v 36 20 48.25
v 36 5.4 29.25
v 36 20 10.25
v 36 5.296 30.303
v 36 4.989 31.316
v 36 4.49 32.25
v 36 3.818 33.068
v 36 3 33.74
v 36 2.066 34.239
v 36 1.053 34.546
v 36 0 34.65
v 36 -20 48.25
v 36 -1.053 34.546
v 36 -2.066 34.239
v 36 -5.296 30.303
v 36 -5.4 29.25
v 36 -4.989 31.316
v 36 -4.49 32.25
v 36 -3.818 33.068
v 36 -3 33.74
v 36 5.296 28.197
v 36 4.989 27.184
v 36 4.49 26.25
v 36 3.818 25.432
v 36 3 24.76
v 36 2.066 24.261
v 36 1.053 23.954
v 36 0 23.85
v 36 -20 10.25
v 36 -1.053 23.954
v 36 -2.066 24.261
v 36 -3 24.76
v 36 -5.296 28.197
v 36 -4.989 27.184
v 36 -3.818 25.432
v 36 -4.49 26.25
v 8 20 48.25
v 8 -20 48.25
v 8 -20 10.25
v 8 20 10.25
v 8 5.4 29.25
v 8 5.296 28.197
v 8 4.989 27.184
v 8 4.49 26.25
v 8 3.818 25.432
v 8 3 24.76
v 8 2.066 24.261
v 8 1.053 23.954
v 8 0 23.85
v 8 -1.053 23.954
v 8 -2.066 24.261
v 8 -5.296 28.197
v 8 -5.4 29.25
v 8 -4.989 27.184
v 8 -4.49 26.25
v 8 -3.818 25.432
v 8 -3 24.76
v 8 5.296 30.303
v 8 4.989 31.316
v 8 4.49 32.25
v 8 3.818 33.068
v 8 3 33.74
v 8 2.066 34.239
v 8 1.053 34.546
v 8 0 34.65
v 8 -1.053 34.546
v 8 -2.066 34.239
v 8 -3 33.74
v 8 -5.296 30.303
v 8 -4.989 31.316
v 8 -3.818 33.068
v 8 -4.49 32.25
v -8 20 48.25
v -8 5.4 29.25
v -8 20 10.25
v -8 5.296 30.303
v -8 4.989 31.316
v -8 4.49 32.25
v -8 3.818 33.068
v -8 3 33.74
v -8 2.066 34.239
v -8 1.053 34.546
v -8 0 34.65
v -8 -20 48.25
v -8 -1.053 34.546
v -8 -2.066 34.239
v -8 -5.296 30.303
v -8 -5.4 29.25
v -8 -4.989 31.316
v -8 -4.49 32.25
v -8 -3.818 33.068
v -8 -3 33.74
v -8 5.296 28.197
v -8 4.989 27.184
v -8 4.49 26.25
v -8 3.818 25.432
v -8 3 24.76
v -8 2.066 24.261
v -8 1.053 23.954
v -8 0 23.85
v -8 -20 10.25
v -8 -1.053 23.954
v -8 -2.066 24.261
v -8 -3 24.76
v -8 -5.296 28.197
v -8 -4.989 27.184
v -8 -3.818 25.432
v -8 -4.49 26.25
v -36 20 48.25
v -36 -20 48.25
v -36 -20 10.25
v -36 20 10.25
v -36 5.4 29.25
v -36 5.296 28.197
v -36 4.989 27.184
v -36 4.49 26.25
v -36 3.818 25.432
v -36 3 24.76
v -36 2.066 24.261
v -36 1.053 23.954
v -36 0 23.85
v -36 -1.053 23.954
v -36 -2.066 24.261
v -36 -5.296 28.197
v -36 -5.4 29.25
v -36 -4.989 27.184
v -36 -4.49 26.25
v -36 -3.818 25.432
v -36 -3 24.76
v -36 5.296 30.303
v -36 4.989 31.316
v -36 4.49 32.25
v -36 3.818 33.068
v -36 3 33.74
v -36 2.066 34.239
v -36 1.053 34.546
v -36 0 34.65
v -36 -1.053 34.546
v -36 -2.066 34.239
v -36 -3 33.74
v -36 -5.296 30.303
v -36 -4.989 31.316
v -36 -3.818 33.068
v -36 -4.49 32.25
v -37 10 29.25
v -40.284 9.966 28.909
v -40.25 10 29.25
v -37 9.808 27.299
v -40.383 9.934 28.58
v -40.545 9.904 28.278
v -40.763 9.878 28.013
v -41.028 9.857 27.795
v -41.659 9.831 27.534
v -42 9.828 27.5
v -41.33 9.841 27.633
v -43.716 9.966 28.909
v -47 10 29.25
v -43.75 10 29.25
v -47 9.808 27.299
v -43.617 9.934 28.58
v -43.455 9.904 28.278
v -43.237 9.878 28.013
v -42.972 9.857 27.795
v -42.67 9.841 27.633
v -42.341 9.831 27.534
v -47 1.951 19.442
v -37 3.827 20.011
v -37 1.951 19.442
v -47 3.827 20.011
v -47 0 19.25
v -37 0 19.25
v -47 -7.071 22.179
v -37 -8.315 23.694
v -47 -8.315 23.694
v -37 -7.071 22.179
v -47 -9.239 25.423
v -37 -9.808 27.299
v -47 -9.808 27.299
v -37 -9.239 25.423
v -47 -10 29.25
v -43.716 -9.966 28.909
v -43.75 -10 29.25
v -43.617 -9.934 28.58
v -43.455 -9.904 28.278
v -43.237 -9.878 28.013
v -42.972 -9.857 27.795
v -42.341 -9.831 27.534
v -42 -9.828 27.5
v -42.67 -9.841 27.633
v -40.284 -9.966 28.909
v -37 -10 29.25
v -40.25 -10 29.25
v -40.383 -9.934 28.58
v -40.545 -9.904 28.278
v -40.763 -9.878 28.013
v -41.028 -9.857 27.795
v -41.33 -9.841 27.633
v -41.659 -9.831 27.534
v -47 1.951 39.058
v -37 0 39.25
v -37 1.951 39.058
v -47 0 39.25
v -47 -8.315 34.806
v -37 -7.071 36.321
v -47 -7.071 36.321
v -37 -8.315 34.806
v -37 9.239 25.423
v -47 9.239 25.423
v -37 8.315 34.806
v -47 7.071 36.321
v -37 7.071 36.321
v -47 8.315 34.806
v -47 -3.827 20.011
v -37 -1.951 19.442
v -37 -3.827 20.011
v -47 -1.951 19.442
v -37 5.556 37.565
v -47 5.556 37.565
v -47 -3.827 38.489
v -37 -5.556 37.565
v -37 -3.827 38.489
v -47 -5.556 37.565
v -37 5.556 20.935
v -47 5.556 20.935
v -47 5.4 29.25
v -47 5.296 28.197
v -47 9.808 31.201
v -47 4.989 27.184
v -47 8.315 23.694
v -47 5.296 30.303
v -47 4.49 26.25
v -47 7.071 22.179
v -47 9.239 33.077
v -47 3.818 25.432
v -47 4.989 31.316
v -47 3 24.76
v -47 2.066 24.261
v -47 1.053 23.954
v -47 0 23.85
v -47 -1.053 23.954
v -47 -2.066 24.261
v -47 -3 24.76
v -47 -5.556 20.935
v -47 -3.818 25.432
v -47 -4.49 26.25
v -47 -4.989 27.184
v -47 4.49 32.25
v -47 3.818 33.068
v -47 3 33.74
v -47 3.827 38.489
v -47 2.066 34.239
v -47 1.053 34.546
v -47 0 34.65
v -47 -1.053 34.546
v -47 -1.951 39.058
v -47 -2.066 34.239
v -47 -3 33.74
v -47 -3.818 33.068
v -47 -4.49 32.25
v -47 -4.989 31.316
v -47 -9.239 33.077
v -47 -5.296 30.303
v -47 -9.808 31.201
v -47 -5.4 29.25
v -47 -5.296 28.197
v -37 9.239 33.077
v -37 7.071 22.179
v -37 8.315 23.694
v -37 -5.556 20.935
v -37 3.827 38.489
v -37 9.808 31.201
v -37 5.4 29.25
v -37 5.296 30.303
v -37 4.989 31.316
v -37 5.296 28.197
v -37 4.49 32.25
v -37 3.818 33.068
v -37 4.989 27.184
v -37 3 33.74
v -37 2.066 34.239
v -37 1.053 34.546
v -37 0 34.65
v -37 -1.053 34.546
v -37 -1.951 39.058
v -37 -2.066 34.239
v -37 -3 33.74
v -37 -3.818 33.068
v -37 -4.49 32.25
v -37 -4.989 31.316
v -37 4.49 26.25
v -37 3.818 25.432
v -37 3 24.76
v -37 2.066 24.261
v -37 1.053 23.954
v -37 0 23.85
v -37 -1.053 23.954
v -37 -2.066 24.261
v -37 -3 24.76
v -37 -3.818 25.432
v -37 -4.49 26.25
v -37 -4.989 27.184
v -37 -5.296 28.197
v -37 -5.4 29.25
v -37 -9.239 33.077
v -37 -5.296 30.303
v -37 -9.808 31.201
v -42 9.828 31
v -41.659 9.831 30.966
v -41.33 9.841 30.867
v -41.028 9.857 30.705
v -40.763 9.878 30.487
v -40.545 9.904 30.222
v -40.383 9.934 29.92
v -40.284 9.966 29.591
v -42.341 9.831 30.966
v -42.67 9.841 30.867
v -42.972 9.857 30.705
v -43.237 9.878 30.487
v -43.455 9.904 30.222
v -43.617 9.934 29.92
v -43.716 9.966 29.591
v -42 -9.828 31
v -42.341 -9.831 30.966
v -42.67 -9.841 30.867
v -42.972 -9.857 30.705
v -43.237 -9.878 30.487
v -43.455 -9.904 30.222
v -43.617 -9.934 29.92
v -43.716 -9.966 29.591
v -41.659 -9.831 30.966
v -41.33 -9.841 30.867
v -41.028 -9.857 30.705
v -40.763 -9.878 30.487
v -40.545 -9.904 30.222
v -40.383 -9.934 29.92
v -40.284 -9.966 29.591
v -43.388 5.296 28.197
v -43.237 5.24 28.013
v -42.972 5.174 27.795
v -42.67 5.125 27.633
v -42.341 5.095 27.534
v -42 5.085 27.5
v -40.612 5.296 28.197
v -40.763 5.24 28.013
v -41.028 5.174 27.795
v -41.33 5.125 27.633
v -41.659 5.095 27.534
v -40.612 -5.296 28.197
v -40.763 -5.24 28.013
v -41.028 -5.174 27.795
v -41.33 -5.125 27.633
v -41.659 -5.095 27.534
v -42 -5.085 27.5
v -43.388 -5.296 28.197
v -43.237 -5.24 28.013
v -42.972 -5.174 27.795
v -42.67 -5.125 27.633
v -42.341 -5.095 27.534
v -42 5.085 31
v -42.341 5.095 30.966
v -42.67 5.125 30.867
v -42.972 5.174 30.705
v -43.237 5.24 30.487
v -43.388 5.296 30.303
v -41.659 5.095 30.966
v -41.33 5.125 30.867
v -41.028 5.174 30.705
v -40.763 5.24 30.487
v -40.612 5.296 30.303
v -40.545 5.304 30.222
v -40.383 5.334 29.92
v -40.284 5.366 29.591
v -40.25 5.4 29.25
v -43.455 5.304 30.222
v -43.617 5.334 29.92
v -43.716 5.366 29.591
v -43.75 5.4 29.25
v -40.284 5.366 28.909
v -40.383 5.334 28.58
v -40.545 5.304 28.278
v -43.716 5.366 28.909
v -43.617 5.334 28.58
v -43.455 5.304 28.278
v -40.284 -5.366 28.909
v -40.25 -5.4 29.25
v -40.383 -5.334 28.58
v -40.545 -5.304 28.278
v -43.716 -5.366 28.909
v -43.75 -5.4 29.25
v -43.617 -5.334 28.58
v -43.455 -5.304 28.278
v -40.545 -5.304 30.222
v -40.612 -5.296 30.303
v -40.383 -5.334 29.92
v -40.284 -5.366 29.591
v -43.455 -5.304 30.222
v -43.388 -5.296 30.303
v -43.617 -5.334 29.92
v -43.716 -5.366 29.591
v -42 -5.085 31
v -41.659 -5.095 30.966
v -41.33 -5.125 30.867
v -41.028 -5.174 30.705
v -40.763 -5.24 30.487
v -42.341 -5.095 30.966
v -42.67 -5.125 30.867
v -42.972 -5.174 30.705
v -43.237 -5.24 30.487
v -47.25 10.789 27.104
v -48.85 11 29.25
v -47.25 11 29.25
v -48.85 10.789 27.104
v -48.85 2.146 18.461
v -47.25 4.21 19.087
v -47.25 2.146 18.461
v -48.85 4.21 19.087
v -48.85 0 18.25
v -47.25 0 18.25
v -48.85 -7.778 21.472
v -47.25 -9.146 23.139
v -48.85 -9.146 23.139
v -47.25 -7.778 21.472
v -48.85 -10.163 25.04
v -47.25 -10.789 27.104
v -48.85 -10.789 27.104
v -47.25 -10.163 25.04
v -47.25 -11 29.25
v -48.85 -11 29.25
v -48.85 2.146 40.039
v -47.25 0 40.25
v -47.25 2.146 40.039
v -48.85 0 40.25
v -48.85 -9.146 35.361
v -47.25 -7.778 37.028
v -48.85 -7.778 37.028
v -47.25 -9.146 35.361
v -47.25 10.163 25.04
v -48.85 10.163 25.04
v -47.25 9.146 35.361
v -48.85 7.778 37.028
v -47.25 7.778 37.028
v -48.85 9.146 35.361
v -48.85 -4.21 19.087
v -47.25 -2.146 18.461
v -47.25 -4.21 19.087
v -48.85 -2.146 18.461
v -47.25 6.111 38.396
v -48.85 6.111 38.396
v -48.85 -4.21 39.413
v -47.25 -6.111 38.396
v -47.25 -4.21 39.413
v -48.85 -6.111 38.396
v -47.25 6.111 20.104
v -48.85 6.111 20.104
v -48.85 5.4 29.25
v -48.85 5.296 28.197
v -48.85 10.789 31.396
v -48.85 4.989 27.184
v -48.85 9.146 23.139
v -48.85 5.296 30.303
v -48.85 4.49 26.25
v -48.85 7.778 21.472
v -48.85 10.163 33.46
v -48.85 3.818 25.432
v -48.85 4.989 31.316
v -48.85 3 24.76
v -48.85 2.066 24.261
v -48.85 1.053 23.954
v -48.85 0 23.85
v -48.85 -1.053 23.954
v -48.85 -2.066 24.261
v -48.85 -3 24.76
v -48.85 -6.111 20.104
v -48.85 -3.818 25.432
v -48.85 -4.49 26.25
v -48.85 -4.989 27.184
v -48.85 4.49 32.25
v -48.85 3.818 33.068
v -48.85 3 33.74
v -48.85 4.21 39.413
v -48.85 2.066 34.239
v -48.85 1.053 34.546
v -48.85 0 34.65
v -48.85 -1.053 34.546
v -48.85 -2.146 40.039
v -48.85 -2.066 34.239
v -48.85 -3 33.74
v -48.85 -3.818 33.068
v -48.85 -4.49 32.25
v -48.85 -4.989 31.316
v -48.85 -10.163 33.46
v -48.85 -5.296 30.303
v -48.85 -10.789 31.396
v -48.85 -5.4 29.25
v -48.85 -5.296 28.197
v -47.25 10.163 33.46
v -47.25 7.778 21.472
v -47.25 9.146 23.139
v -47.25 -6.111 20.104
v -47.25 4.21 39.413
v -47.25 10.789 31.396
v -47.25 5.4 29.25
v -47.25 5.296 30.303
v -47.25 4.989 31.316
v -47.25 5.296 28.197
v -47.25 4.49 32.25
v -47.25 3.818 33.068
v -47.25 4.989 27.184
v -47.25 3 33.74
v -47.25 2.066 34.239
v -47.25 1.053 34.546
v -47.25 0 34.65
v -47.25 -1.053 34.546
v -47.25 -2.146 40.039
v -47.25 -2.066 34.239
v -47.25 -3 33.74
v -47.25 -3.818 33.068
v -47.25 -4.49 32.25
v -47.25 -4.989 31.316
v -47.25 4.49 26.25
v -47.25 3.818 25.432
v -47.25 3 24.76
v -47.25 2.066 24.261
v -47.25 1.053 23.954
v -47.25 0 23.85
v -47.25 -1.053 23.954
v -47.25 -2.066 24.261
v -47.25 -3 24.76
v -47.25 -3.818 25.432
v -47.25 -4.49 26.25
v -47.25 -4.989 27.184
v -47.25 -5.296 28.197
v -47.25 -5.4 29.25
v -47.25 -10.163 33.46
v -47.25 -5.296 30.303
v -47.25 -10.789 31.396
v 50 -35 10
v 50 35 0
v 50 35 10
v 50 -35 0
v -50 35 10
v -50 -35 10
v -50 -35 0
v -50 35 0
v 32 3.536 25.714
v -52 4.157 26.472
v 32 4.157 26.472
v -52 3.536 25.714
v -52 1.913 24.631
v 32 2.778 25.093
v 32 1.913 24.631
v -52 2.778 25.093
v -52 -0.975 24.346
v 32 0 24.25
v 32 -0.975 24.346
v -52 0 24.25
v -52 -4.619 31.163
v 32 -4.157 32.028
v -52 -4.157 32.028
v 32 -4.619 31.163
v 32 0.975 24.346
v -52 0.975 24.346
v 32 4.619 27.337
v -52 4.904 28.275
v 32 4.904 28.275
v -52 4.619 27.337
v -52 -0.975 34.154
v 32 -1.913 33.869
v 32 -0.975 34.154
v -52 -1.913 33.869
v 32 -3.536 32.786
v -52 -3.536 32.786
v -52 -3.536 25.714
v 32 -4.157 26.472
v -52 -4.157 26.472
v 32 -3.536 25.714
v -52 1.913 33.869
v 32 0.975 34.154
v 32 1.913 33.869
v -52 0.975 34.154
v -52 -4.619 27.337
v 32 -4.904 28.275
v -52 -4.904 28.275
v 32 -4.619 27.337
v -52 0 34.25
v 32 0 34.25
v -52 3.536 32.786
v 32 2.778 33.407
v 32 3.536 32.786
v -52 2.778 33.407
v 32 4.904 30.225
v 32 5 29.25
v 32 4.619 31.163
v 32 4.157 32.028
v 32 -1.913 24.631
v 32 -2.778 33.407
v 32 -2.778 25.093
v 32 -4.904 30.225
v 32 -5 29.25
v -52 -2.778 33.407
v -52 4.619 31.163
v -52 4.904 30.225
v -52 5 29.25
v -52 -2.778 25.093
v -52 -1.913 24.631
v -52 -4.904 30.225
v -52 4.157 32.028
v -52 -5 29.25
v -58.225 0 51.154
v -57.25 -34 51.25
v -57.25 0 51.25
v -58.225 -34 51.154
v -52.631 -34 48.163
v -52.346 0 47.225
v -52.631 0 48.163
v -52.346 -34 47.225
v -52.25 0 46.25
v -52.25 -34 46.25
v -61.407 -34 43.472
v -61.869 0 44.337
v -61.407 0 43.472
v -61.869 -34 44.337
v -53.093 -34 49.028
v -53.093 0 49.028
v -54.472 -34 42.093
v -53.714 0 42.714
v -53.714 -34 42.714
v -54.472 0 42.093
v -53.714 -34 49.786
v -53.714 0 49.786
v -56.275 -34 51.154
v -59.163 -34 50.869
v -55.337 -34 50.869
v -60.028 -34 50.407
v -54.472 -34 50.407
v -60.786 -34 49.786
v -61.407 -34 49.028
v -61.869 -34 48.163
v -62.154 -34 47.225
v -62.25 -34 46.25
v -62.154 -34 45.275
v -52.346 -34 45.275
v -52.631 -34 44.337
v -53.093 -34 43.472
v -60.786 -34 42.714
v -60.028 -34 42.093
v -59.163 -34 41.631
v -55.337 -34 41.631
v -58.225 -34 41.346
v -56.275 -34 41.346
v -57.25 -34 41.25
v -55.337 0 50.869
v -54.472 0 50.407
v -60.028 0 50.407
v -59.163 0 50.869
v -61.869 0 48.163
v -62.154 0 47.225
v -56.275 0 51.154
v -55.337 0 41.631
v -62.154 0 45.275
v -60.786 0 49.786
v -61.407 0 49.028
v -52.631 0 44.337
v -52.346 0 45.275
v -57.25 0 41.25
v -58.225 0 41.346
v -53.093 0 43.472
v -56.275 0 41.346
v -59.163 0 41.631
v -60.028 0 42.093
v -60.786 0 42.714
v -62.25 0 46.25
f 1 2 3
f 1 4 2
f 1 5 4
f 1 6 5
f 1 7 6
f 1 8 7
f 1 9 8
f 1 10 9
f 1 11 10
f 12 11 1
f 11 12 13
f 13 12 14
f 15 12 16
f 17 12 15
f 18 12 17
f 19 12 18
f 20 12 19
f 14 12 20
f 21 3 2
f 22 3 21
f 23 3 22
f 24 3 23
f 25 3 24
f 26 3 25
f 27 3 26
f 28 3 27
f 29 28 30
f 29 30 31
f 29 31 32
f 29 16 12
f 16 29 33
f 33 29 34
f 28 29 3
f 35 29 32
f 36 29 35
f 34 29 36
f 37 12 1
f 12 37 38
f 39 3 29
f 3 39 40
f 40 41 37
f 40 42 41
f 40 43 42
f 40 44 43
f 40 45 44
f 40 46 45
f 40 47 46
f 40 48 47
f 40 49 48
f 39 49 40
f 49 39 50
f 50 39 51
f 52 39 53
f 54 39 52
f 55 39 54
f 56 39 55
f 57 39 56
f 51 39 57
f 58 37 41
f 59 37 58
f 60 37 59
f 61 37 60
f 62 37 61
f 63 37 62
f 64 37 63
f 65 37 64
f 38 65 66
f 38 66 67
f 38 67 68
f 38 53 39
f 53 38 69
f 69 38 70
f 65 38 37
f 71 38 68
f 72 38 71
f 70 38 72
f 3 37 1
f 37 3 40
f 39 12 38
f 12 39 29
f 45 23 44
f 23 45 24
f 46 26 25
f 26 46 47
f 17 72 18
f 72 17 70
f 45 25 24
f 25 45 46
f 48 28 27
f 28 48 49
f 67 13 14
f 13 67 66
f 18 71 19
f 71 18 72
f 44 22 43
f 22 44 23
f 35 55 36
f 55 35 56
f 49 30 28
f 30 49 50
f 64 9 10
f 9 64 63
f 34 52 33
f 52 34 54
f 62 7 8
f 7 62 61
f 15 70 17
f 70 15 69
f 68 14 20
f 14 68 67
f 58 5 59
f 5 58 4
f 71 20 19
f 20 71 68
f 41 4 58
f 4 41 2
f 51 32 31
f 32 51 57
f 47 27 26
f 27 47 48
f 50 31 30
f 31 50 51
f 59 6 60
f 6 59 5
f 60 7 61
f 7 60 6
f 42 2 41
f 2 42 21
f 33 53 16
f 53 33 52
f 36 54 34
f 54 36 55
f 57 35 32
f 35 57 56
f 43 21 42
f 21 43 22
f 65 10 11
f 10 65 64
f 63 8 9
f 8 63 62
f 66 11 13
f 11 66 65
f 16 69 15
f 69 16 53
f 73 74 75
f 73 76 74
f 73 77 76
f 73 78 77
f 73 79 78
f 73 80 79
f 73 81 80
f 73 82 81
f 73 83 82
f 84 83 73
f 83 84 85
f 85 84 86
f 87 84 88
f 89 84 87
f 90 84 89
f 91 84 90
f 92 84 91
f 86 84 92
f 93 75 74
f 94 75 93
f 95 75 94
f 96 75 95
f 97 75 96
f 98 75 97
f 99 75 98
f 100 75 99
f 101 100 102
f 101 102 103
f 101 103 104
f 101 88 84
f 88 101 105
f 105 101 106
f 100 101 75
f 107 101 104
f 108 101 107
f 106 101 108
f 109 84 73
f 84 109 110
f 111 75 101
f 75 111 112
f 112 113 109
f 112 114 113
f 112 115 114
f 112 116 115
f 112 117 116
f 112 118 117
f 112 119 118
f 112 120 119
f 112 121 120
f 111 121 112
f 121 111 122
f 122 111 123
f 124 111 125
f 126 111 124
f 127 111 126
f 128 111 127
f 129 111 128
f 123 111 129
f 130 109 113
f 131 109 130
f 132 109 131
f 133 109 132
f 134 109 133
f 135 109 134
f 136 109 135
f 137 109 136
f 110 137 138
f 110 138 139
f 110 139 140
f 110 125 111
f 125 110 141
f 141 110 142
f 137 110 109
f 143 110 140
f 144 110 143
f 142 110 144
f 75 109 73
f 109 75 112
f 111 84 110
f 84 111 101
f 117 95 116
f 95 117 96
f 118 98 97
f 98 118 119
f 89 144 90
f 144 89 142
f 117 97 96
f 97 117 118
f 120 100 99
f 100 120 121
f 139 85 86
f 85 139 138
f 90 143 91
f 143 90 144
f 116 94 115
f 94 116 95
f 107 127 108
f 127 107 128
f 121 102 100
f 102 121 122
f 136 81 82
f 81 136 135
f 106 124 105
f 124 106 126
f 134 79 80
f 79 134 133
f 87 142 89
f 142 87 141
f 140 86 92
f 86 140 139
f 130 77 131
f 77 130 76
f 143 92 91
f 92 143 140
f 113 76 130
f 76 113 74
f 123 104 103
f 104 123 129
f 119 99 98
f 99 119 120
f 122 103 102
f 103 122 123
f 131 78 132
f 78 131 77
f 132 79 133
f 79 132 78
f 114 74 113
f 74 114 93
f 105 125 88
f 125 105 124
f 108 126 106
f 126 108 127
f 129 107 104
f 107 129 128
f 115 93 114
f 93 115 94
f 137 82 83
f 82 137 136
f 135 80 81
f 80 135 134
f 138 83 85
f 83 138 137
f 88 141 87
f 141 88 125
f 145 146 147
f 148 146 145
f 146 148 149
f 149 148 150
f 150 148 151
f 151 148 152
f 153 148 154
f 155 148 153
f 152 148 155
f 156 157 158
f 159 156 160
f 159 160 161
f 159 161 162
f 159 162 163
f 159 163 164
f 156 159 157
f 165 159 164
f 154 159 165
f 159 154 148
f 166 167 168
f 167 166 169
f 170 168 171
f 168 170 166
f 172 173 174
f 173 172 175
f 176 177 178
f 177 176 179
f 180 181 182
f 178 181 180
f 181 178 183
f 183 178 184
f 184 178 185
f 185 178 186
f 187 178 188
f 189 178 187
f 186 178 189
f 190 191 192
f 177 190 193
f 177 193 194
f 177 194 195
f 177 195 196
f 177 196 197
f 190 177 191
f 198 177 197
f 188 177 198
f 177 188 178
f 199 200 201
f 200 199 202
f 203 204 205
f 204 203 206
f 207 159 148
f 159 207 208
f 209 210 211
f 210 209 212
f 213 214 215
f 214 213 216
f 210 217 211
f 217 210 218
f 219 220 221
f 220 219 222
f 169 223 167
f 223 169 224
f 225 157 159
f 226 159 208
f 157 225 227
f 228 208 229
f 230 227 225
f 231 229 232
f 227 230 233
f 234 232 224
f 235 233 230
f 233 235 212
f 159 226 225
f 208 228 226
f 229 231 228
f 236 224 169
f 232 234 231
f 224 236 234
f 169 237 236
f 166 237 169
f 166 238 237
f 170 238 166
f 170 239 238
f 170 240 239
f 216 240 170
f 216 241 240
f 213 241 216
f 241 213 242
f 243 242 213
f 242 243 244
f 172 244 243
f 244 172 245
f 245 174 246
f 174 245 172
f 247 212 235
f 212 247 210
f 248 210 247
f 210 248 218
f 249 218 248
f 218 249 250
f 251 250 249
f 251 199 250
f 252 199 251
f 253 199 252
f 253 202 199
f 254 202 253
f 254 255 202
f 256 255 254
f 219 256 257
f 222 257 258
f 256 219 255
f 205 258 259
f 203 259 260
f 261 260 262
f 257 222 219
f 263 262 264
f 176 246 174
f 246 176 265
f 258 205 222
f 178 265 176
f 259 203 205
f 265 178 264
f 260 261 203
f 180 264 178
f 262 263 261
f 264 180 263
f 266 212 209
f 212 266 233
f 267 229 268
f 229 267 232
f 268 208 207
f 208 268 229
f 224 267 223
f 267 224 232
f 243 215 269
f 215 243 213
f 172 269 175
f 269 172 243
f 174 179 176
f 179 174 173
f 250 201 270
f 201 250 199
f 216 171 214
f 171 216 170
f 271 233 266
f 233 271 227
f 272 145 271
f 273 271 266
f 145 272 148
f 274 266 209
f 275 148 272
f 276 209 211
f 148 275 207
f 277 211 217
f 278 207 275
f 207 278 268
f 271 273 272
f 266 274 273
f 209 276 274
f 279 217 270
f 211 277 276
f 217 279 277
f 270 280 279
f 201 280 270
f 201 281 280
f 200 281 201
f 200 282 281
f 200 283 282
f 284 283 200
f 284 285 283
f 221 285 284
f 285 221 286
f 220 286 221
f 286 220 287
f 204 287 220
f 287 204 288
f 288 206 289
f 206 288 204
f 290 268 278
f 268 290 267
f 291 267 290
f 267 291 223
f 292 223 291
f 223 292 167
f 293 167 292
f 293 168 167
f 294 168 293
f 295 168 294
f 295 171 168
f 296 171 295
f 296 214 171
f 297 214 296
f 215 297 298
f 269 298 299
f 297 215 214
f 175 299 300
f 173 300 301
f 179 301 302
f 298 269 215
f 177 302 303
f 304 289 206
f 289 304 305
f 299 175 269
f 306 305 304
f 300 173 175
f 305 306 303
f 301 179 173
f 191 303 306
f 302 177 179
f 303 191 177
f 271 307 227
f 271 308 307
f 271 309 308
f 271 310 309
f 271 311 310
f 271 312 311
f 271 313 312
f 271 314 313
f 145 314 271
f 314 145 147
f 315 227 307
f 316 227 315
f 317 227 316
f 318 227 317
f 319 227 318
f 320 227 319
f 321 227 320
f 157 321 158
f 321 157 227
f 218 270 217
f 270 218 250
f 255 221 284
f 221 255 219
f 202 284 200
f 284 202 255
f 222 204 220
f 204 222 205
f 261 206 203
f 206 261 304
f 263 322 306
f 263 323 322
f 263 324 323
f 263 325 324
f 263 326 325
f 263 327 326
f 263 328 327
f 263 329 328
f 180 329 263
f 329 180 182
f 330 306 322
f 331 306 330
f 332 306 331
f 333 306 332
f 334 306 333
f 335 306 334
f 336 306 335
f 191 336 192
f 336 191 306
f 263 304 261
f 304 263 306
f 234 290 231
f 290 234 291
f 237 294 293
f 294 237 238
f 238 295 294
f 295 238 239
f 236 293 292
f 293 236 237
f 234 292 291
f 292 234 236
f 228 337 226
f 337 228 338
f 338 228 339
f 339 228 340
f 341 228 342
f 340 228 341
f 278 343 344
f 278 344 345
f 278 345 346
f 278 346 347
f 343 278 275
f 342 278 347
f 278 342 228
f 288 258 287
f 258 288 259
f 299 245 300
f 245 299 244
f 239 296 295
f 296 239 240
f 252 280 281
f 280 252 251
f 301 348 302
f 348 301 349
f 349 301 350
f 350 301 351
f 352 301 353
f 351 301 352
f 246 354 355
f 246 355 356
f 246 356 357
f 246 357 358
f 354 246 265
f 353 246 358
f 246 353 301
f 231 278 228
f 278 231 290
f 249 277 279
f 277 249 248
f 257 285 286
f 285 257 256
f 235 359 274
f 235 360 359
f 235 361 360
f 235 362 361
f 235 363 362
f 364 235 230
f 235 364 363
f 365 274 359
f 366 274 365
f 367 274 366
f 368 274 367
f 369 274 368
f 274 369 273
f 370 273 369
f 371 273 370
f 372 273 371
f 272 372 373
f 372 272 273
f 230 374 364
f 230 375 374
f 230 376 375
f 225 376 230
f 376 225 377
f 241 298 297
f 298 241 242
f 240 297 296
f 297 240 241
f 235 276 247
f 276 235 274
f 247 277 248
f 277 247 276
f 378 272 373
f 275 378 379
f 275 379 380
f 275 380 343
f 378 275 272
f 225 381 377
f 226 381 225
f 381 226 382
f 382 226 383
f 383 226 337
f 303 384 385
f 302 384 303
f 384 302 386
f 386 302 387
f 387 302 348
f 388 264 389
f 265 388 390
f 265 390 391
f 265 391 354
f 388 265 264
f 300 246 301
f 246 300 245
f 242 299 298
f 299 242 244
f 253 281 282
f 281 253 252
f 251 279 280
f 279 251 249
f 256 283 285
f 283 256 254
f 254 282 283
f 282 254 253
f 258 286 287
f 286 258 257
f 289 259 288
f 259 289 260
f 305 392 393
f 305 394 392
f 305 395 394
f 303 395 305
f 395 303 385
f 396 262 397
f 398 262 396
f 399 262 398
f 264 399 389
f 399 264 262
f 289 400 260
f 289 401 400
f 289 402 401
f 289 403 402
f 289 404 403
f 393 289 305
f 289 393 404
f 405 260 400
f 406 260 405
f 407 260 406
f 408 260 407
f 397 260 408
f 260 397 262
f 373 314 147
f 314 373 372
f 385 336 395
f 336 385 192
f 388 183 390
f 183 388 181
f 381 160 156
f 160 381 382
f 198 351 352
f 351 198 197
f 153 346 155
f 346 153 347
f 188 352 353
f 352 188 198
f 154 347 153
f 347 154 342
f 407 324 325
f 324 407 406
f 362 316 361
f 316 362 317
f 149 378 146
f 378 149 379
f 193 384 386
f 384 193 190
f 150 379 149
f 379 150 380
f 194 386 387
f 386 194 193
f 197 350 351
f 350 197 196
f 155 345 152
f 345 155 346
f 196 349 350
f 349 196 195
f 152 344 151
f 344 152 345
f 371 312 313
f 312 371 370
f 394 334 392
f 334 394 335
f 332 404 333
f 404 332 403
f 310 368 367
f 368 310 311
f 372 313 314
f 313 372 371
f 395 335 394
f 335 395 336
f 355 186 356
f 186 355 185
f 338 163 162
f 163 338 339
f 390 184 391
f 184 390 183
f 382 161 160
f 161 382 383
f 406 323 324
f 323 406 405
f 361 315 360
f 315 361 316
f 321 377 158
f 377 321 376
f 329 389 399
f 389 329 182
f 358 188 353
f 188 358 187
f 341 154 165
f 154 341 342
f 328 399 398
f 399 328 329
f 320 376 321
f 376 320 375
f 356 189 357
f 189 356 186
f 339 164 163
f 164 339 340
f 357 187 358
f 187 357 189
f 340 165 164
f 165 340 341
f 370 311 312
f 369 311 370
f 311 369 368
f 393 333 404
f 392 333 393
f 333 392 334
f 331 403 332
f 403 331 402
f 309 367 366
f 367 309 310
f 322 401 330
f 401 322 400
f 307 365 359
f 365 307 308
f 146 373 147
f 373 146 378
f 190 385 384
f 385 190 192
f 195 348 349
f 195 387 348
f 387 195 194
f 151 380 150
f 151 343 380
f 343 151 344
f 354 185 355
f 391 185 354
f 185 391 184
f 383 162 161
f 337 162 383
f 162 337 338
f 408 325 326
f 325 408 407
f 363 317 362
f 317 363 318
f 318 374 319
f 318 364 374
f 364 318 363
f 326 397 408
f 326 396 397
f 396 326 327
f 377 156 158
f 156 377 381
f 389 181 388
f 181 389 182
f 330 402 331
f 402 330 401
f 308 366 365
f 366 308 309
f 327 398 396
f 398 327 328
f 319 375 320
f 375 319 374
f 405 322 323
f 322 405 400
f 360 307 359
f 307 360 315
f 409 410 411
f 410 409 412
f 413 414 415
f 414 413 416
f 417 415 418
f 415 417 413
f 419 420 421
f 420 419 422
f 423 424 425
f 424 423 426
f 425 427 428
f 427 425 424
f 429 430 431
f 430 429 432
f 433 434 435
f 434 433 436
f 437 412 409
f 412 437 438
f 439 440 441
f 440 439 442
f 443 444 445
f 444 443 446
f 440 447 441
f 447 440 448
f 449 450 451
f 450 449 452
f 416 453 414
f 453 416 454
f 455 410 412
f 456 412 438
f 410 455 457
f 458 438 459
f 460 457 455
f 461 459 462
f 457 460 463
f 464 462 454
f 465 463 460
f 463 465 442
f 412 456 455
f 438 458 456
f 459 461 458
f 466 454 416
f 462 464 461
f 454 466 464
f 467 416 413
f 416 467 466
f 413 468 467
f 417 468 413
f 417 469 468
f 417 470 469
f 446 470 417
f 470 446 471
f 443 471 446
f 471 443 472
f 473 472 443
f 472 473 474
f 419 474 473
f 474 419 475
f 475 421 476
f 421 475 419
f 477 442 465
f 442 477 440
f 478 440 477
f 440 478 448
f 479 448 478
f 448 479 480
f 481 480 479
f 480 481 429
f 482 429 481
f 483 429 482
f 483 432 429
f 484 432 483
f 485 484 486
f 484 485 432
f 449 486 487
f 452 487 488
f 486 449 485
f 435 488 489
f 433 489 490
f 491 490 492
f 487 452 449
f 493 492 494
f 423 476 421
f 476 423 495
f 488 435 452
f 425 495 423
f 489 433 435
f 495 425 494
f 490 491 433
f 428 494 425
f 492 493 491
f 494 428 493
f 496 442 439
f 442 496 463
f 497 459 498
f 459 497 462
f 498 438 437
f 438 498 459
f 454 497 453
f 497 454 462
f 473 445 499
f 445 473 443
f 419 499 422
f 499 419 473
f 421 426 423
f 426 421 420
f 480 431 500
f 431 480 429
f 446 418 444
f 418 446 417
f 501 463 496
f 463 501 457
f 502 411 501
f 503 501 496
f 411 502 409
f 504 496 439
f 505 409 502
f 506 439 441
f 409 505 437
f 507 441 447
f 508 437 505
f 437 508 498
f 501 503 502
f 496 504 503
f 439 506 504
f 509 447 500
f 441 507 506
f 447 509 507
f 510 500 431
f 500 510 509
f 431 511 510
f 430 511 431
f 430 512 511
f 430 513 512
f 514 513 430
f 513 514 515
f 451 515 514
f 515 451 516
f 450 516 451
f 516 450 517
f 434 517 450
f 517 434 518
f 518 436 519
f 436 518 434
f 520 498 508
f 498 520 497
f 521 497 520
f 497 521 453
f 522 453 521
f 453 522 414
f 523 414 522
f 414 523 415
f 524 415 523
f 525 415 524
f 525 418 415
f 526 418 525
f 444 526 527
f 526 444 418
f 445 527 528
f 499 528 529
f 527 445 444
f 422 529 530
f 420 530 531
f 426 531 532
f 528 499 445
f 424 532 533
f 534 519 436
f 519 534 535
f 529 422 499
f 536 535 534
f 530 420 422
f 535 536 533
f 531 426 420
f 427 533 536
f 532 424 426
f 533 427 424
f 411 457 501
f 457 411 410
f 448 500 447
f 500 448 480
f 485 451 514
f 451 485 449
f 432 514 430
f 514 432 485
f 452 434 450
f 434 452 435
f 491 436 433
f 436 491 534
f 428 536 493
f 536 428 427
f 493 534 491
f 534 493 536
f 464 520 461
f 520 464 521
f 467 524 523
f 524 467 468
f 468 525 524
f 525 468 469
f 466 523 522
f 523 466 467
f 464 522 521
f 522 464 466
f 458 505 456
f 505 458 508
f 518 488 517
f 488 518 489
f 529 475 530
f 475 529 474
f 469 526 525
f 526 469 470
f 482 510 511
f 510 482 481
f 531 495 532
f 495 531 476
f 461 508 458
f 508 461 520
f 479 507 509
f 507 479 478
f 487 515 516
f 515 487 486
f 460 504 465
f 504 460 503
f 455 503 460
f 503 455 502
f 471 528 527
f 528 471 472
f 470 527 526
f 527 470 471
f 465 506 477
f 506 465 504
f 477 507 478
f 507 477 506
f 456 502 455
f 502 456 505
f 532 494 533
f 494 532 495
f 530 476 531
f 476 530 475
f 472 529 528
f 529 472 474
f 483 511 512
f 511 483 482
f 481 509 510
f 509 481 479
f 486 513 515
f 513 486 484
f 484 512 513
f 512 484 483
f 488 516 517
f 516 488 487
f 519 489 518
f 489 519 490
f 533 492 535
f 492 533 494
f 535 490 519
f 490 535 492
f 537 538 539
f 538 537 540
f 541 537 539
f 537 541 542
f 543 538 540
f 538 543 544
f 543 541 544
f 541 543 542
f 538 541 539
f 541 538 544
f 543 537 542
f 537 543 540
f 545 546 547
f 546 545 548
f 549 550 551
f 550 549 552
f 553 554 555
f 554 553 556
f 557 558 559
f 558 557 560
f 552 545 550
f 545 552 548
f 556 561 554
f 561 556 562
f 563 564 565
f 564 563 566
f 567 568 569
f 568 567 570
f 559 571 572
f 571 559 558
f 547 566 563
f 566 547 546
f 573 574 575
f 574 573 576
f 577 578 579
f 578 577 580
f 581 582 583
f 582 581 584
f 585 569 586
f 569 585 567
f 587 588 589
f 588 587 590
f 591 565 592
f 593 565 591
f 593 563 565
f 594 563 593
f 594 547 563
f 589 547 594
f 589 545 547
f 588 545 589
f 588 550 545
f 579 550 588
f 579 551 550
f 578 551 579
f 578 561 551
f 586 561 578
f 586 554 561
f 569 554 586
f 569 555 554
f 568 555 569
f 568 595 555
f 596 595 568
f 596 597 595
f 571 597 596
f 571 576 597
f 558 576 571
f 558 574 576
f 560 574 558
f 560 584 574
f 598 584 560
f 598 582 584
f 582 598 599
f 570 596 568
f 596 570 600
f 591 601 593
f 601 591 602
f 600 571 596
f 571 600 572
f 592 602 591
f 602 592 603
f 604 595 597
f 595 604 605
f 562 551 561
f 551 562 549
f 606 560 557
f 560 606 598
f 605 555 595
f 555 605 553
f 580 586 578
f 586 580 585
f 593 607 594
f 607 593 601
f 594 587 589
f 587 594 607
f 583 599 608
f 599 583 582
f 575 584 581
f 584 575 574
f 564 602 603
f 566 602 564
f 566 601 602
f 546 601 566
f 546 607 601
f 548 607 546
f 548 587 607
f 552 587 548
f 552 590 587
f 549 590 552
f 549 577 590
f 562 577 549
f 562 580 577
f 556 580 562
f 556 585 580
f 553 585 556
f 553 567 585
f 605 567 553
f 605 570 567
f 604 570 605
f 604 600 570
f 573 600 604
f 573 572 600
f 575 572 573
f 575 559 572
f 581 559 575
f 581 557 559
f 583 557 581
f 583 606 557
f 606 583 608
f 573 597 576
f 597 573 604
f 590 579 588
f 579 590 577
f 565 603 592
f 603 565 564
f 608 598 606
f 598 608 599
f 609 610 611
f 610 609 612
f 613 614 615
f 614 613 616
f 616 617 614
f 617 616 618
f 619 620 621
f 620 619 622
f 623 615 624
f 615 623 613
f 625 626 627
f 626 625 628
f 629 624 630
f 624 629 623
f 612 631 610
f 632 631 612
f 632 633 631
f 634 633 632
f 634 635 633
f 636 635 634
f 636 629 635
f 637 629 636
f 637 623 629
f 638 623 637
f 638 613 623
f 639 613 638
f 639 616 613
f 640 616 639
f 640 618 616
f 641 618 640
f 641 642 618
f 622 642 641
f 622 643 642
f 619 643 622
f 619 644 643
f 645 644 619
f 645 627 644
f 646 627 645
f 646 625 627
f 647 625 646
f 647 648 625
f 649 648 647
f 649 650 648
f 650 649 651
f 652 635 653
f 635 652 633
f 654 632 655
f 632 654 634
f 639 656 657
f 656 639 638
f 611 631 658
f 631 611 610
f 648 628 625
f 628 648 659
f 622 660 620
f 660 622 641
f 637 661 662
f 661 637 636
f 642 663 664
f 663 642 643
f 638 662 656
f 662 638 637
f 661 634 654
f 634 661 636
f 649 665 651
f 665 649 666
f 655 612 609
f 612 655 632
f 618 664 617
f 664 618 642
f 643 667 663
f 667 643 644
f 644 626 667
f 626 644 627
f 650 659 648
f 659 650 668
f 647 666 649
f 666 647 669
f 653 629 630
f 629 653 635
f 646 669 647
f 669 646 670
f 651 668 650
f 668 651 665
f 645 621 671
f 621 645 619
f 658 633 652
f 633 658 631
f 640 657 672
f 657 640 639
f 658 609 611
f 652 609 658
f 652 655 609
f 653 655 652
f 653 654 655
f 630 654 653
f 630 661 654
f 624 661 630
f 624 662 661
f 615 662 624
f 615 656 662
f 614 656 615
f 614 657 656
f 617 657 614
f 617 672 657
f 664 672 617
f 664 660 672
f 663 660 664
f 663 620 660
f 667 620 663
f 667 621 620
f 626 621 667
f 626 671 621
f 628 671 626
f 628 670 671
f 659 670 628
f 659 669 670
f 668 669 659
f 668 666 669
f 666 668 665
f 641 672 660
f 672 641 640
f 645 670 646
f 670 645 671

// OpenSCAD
$fn = 32;

// ------------------------------------------------------------------------
// Machine vise: screw d10, jaws 28 x 38 mm
// Every part is its own module, assembly() places every instance.
// ------------------------------------------------------------------------

// --- part 1 ---
module vise_bed() {
  difference() {
    translate([-50, -35, 0]) cube([100, 70, 10]);
  }
}

// --- part 2 ---
module vise_jaw() {
  difference() {
    translate([-14, -20, 0]) cube([28, 40, 38]);
    translate([0, 0, 19]) rotate([0, 90, 0]) cylinder(h = 30, d = 10.8, center = true);
  }
}

// --- part 3 ---
module vise_screw() {
  translate([0, 0, -42]) cylinder(h = 84, d = 10);
}

// --- part 4 ---
module screw_collar() {
  difference() {
    cylinder(h = 10, d = 20);
    translate([0, 0, -1]) cylinder(h = 12, d = 10.8);
    translate([0, 0, 5]) rotate([90, 0, 0]) cylinder(h = 22, d = 3.5, center = true);
  }
}

// --- part 5 ---
module screw_washer() {
  difference() {
      translate([0, 0, 0]) cylinder(h = 1.6, d = 22);
      translate([0, 0, -1]) cylinder(h = 3.6, d = 10.8);
    }
}

// --- part 6 ---
module vise_handle() {
  cylinder(h = 34, d = 10);
}

// --- assembly ---
module assembly() {
  color([0.80, 0.24, 0.20]) translate([0, 0, 0]) rotate([0, 0, 0]) vise_bed();
  color([0.20, 0.45, 0.75]) translate([22, 0, 10.25]) rotate([0, 0, 0]) vise_jaw();
  color([0.25, 0.62, 0.32]) translate([-22, 0, 10.25]) rotate([0, 0, 0]) vise_jaw();
  color([0.92, 0.70, 0.18]) translate([-10, 0, 29.25]) rotate([0, 90, 0]) vise_screw();
  color([0.58, 0.35, 0.70]) translate([-47, 0, 29.25]) rotate([0, 90, 0]) screw_collar();
  color([0.16, 0.66, 0.66]) translate([-48.85, 0, 29.25]) rotate([0, 90, 0]) screw_washer();
  color([0.85, 0.48, 0.18]) translate([-57.25, 0, 46.25]) rotate([90, 0, 0]) vise_handle();
}

assembly();
